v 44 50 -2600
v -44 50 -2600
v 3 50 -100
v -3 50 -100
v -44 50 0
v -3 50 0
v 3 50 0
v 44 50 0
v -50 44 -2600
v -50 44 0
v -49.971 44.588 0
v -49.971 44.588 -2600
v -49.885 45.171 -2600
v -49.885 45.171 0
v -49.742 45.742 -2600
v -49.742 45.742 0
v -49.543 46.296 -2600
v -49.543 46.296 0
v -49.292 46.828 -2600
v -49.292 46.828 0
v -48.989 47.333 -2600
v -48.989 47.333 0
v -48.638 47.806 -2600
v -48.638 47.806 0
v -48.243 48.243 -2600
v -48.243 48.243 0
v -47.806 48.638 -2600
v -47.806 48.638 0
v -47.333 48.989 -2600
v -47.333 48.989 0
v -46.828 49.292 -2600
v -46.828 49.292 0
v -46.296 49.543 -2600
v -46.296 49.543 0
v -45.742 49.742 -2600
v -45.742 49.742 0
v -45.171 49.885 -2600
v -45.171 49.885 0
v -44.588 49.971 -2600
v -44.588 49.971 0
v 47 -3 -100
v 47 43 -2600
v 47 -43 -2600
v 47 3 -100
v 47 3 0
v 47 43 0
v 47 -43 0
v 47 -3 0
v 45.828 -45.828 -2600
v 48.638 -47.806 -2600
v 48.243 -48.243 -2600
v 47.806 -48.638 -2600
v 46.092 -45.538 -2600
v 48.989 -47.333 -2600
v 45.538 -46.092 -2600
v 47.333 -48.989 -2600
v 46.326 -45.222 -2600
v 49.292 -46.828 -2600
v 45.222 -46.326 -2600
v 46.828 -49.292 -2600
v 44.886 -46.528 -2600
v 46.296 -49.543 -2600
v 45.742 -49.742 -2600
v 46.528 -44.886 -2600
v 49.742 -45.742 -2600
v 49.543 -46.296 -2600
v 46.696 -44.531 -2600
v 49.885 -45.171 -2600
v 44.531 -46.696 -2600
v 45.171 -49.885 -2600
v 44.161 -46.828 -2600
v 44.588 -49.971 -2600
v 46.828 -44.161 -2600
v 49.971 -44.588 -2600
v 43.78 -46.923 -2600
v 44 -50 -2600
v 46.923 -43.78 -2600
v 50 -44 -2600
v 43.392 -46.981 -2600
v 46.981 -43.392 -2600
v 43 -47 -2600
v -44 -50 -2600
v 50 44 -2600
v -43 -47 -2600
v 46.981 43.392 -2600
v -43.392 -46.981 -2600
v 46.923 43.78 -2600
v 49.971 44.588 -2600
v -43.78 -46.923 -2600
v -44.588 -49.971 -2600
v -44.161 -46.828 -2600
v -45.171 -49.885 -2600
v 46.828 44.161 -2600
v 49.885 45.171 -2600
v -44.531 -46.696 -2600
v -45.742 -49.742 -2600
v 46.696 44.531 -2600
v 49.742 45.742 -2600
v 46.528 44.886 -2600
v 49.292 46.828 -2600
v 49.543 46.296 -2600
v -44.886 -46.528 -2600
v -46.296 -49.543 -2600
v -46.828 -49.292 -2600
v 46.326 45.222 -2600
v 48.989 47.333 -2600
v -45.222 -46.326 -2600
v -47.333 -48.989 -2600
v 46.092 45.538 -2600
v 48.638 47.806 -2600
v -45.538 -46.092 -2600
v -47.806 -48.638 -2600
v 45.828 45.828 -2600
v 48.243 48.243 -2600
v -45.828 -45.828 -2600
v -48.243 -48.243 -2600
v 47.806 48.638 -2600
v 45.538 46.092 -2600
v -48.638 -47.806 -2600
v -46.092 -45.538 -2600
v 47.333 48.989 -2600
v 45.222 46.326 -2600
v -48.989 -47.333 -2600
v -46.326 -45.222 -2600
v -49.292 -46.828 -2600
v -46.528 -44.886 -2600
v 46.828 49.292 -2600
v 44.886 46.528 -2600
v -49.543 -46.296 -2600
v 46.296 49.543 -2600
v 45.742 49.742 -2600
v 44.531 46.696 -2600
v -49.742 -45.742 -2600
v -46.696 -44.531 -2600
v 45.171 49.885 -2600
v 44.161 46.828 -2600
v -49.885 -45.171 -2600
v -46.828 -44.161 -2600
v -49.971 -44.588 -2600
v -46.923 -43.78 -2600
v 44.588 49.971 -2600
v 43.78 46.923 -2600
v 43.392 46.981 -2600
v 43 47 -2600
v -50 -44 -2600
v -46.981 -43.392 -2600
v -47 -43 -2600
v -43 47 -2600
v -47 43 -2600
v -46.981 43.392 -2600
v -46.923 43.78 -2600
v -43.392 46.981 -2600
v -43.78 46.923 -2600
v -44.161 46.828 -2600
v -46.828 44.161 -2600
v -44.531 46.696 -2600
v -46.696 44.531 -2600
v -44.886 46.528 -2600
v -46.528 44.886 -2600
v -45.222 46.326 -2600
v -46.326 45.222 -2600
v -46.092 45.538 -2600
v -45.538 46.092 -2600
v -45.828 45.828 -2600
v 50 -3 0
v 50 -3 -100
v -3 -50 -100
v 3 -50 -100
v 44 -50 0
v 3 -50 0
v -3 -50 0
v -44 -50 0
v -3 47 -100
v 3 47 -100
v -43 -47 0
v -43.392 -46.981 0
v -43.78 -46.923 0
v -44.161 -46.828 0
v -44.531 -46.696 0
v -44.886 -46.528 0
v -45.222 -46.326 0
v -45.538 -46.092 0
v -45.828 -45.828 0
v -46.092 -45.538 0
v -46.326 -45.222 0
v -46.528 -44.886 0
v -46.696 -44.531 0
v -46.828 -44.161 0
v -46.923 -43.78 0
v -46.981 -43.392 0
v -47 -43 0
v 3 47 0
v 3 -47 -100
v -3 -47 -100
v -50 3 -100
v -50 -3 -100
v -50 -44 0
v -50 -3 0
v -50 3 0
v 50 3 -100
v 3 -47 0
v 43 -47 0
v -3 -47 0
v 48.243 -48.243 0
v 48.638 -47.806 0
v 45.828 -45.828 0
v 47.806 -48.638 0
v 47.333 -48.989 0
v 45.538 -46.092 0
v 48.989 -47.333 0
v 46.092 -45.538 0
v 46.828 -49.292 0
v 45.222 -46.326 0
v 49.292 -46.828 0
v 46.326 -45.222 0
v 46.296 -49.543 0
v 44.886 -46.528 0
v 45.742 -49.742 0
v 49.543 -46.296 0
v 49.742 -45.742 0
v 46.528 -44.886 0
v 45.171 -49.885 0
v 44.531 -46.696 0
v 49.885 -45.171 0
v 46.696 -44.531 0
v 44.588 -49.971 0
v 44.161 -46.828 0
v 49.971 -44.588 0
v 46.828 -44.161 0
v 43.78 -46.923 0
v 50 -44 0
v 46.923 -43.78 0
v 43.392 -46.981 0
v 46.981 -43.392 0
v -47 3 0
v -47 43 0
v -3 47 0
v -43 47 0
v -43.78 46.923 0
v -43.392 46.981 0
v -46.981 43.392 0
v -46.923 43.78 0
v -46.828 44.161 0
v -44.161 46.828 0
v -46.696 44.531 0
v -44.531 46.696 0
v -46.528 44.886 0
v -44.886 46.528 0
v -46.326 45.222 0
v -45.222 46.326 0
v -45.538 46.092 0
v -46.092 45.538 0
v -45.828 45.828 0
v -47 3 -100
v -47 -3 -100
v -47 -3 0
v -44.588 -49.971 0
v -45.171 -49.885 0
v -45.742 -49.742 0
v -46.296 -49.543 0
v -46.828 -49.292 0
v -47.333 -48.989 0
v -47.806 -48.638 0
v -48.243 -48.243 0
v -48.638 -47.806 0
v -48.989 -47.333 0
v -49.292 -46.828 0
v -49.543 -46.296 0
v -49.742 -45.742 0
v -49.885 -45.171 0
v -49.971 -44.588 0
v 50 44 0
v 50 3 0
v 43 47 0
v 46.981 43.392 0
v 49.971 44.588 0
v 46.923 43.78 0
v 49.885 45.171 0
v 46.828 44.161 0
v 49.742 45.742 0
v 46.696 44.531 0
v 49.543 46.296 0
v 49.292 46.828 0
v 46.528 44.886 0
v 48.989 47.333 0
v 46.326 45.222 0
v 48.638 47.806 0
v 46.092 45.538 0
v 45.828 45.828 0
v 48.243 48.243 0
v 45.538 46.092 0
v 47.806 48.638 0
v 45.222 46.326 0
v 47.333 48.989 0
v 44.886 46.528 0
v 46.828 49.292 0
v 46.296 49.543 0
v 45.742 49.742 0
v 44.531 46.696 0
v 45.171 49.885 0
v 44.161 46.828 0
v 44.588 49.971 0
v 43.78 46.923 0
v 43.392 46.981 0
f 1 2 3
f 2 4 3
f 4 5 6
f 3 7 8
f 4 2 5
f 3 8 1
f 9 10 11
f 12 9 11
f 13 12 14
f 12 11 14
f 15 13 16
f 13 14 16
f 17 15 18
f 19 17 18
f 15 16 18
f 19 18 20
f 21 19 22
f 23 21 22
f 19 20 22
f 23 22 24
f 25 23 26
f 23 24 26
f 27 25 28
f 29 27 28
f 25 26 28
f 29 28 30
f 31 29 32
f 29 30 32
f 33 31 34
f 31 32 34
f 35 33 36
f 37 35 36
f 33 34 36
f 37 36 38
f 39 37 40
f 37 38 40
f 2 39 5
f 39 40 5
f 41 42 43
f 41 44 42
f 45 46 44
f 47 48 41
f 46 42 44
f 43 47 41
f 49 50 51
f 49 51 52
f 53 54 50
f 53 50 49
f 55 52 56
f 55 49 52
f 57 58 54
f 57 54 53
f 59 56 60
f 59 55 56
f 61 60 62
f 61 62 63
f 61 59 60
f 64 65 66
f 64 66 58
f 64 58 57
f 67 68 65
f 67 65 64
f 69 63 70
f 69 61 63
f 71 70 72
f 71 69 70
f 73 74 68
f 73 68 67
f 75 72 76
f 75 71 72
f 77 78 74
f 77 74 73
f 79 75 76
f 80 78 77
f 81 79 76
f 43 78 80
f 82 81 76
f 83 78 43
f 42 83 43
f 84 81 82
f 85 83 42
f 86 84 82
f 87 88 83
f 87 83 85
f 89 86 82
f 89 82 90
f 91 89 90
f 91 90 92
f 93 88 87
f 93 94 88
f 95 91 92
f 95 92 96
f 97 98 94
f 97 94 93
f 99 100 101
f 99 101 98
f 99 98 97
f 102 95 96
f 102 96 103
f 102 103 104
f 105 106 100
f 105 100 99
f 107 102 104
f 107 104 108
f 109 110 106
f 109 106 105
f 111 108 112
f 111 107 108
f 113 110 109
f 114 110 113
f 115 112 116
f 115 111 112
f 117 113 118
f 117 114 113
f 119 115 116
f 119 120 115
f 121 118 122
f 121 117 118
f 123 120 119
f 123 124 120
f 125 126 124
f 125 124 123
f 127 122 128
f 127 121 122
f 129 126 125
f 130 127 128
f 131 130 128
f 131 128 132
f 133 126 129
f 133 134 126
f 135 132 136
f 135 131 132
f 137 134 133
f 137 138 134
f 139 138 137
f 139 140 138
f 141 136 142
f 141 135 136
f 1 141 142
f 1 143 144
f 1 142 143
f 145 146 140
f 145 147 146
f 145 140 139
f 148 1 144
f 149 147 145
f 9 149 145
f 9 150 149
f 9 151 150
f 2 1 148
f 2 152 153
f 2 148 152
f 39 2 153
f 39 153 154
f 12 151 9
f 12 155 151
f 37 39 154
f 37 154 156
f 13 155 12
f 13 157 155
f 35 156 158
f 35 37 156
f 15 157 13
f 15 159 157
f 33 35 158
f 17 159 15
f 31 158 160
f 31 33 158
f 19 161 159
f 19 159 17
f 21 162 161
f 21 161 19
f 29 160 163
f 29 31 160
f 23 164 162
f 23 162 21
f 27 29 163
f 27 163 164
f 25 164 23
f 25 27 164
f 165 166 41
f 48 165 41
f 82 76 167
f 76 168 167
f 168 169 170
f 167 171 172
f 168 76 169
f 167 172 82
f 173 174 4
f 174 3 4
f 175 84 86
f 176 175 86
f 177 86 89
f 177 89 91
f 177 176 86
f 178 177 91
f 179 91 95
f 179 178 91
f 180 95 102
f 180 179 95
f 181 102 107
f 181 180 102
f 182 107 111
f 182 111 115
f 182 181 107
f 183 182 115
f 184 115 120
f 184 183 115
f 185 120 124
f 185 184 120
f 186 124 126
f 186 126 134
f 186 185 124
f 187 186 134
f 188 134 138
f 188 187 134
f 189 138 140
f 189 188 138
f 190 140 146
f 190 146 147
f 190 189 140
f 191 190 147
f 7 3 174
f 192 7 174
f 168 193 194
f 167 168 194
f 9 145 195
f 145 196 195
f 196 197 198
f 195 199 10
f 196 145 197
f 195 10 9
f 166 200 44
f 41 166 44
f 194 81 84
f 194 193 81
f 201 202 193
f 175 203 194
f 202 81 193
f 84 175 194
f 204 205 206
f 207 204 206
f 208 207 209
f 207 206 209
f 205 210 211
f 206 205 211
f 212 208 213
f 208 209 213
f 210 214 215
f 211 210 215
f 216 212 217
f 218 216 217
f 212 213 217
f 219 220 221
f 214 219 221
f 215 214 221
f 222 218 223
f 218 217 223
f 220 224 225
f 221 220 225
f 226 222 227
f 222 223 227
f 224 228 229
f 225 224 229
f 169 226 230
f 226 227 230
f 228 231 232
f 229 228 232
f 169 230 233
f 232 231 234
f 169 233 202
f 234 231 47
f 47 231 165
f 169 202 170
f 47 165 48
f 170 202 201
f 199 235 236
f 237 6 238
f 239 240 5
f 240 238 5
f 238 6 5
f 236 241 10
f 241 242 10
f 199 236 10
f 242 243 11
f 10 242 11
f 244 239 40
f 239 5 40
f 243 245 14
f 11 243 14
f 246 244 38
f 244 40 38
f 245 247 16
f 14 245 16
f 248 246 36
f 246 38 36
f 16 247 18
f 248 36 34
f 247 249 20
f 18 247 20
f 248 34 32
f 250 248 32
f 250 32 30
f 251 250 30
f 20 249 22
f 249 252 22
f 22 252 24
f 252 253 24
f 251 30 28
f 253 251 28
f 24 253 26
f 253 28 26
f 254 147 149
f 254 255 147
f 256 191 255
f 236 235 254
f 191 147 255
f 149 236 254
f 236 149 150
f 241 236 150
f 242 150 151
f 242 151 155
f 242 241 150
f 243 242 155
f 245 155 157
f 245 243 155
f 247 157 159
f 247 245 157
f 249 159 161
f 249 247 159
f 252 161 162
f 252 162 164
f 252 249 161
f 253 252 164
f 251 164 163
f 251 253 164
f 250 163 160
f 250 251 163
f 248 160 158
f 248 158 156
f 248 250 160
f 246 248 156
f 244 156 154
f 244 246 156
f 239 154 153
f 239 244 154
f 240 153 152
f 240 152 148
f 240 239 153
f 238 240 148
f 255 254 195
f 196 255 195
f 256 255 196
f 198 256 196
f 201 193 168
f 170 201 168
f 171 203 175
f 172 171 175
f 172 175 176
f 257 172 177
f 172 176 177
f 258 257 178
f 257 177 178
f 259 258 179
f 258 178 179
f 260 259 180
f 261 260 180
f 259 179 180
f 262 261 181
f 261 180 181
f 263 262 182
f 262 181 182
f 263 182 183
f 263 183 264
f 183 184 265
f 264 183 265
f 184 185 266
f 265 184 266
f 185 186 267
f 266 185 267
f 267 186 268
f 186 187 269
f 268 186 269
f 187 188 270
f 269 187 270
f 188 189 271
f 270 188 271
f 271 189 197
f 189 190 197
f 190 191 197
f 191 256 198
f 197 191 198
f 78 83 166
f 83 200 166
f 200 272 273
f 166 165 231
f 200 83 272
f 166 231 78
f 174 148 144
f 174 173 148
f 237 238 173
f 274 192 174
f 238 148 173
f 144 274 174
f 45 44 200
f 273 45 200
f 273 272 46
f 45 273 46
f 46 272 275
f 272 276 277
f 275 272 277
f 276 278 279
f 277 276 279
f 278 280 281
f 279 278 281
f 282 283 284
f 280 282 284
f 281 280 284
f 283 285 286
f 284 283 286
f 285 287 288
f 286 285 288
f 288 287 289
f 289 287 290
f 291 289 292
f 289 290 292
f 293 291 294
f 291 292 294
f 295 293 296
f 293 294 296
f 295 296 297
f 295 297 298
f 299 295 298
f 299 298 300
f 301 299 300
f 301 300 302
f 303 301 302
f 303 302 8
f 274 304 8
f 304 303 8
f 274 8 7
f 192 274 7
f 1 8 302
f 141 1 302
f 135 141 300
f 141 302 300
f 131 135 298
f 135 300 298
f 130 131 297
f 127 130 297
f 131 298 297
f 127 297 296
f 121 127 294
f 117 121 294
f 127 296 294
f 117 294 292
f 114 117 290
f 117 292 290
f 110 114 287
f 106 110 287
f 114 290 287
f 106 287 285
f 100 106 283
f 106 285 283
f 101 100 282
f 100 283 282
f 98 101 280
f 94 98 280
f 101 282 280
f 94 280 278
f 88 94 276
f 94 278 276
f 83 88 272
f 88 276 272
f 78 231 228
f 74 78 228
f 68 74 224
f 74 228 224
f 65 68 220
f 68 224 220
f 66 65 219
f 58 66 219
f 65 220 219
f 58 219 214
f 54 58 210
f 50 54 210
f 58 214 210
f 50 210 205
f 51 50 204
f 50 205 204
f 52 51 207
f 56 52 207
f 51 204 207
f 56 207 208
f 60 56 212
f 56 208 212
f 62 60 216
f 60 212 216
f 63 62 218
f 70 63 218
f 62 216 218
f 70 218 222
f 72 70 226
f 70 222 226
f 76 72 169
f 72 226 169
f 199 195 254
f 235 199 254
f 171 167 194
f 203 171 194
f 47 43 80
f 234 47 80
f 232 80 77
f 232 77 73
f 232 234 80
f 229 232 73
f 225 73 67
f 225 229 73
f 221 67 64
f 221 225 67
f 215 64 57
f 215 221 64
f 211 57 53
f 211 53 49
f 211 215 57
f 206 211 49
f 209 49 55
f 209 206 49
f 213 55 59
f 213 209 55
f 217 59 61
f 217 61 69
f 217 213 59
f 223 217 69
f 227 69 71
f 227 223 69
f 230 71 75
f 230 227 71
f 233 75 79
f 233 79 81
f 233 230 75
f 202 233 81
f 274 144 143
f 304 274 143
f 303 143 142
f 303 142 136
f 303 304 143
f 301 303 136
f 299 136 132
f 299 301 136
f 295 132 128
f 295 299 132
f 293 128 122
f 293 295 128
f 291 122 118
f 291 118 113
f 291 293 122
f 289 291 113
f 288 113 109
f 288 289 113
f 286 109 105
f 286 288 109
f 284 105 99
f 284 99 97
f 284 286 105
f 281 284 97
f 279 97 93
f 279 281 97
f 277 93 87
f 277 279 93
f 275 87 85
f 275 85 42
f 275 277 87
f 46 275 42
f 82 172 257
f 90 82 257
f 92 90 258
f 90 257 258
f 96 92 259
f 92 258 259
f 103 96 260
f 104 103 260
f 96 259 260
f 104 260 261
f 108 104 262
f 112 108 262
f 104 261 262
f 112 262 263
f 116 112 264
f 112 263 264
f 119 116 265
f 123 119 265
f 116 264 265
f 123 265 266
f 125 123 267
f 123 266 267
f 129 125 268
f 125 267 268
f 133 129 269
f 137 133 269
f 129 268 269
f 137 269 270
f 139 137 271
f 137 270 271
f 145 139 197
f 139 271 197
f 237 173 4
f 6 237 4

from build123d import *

# Parameters (mm, degrees)
EXTRUDE_1_DEPTH     = 2600
CUT_EXTRUDE_1_DEPTH = 100


with BuildPart() as part:
    # Эскиз1 → Бобышка-Вытянуть1 (new body)
    with BuildSketch(Plane.XY):
        with BuildLine():
            Line((-44, 50), (44, 50))
            ThreePointArc((44, 50), (48.242640687, 48.242640687), (50, 44))
            Line((50, 44), (50, -44))
            ThreePointArc((50, -44), (48.242640687, -48.242640687), (44, -50))
            Line((44, -50), (-44, -50))
            ThreePointArc((-44, -50), (-48.242640687, -48.242640687), (-50, -44))
            Line((-50, -44), (-50, 44))
            ThreePointArc((-50, 44), (-48.242640687, 48.242640687), (-44, 50))
        make_face()
        with BuildLine():
            Line((-43, 47), (43, 47))
            ThreePointArc((43, 47), (45.828427125, 45.828427125), (47, 43))
            Line((47, 43), (47, -43))
            ThreePointArc((47, -43), (45.828427125, -45.828427125), (43, -47))
            Line((43, -47), (-43, -47))
            ThreePointArc((-43, -47), (-45.828427125, -45.828427125), (-47, -43))
            Line((-47, -43), (-47, 43))
            ThreePointArc((-47, 43), (-45.828427125, 45.828427125), (-43, 47))
        make_face(mode=Mode.SUBTRACT)
    extrude(amount=-EXTRUDE_1_DEPTH)

    # Эскиз2 → Вырез-Вытянуть1 (cut)
    with BuildSketch(Plane.XY):
        Polygon((-50, 3), (-3, 3), (-3, 50), (3, 50), (3, 3), (50, 3), (50, -3), (3, -3), (3, -50), (-3, -50), (-3, -3), (-50, -3), align=None)
    extrude(amount=-CUT_EXTRUDE_1_DEPTH, mode=Mode.SUBTRACT)


solid = part.part
